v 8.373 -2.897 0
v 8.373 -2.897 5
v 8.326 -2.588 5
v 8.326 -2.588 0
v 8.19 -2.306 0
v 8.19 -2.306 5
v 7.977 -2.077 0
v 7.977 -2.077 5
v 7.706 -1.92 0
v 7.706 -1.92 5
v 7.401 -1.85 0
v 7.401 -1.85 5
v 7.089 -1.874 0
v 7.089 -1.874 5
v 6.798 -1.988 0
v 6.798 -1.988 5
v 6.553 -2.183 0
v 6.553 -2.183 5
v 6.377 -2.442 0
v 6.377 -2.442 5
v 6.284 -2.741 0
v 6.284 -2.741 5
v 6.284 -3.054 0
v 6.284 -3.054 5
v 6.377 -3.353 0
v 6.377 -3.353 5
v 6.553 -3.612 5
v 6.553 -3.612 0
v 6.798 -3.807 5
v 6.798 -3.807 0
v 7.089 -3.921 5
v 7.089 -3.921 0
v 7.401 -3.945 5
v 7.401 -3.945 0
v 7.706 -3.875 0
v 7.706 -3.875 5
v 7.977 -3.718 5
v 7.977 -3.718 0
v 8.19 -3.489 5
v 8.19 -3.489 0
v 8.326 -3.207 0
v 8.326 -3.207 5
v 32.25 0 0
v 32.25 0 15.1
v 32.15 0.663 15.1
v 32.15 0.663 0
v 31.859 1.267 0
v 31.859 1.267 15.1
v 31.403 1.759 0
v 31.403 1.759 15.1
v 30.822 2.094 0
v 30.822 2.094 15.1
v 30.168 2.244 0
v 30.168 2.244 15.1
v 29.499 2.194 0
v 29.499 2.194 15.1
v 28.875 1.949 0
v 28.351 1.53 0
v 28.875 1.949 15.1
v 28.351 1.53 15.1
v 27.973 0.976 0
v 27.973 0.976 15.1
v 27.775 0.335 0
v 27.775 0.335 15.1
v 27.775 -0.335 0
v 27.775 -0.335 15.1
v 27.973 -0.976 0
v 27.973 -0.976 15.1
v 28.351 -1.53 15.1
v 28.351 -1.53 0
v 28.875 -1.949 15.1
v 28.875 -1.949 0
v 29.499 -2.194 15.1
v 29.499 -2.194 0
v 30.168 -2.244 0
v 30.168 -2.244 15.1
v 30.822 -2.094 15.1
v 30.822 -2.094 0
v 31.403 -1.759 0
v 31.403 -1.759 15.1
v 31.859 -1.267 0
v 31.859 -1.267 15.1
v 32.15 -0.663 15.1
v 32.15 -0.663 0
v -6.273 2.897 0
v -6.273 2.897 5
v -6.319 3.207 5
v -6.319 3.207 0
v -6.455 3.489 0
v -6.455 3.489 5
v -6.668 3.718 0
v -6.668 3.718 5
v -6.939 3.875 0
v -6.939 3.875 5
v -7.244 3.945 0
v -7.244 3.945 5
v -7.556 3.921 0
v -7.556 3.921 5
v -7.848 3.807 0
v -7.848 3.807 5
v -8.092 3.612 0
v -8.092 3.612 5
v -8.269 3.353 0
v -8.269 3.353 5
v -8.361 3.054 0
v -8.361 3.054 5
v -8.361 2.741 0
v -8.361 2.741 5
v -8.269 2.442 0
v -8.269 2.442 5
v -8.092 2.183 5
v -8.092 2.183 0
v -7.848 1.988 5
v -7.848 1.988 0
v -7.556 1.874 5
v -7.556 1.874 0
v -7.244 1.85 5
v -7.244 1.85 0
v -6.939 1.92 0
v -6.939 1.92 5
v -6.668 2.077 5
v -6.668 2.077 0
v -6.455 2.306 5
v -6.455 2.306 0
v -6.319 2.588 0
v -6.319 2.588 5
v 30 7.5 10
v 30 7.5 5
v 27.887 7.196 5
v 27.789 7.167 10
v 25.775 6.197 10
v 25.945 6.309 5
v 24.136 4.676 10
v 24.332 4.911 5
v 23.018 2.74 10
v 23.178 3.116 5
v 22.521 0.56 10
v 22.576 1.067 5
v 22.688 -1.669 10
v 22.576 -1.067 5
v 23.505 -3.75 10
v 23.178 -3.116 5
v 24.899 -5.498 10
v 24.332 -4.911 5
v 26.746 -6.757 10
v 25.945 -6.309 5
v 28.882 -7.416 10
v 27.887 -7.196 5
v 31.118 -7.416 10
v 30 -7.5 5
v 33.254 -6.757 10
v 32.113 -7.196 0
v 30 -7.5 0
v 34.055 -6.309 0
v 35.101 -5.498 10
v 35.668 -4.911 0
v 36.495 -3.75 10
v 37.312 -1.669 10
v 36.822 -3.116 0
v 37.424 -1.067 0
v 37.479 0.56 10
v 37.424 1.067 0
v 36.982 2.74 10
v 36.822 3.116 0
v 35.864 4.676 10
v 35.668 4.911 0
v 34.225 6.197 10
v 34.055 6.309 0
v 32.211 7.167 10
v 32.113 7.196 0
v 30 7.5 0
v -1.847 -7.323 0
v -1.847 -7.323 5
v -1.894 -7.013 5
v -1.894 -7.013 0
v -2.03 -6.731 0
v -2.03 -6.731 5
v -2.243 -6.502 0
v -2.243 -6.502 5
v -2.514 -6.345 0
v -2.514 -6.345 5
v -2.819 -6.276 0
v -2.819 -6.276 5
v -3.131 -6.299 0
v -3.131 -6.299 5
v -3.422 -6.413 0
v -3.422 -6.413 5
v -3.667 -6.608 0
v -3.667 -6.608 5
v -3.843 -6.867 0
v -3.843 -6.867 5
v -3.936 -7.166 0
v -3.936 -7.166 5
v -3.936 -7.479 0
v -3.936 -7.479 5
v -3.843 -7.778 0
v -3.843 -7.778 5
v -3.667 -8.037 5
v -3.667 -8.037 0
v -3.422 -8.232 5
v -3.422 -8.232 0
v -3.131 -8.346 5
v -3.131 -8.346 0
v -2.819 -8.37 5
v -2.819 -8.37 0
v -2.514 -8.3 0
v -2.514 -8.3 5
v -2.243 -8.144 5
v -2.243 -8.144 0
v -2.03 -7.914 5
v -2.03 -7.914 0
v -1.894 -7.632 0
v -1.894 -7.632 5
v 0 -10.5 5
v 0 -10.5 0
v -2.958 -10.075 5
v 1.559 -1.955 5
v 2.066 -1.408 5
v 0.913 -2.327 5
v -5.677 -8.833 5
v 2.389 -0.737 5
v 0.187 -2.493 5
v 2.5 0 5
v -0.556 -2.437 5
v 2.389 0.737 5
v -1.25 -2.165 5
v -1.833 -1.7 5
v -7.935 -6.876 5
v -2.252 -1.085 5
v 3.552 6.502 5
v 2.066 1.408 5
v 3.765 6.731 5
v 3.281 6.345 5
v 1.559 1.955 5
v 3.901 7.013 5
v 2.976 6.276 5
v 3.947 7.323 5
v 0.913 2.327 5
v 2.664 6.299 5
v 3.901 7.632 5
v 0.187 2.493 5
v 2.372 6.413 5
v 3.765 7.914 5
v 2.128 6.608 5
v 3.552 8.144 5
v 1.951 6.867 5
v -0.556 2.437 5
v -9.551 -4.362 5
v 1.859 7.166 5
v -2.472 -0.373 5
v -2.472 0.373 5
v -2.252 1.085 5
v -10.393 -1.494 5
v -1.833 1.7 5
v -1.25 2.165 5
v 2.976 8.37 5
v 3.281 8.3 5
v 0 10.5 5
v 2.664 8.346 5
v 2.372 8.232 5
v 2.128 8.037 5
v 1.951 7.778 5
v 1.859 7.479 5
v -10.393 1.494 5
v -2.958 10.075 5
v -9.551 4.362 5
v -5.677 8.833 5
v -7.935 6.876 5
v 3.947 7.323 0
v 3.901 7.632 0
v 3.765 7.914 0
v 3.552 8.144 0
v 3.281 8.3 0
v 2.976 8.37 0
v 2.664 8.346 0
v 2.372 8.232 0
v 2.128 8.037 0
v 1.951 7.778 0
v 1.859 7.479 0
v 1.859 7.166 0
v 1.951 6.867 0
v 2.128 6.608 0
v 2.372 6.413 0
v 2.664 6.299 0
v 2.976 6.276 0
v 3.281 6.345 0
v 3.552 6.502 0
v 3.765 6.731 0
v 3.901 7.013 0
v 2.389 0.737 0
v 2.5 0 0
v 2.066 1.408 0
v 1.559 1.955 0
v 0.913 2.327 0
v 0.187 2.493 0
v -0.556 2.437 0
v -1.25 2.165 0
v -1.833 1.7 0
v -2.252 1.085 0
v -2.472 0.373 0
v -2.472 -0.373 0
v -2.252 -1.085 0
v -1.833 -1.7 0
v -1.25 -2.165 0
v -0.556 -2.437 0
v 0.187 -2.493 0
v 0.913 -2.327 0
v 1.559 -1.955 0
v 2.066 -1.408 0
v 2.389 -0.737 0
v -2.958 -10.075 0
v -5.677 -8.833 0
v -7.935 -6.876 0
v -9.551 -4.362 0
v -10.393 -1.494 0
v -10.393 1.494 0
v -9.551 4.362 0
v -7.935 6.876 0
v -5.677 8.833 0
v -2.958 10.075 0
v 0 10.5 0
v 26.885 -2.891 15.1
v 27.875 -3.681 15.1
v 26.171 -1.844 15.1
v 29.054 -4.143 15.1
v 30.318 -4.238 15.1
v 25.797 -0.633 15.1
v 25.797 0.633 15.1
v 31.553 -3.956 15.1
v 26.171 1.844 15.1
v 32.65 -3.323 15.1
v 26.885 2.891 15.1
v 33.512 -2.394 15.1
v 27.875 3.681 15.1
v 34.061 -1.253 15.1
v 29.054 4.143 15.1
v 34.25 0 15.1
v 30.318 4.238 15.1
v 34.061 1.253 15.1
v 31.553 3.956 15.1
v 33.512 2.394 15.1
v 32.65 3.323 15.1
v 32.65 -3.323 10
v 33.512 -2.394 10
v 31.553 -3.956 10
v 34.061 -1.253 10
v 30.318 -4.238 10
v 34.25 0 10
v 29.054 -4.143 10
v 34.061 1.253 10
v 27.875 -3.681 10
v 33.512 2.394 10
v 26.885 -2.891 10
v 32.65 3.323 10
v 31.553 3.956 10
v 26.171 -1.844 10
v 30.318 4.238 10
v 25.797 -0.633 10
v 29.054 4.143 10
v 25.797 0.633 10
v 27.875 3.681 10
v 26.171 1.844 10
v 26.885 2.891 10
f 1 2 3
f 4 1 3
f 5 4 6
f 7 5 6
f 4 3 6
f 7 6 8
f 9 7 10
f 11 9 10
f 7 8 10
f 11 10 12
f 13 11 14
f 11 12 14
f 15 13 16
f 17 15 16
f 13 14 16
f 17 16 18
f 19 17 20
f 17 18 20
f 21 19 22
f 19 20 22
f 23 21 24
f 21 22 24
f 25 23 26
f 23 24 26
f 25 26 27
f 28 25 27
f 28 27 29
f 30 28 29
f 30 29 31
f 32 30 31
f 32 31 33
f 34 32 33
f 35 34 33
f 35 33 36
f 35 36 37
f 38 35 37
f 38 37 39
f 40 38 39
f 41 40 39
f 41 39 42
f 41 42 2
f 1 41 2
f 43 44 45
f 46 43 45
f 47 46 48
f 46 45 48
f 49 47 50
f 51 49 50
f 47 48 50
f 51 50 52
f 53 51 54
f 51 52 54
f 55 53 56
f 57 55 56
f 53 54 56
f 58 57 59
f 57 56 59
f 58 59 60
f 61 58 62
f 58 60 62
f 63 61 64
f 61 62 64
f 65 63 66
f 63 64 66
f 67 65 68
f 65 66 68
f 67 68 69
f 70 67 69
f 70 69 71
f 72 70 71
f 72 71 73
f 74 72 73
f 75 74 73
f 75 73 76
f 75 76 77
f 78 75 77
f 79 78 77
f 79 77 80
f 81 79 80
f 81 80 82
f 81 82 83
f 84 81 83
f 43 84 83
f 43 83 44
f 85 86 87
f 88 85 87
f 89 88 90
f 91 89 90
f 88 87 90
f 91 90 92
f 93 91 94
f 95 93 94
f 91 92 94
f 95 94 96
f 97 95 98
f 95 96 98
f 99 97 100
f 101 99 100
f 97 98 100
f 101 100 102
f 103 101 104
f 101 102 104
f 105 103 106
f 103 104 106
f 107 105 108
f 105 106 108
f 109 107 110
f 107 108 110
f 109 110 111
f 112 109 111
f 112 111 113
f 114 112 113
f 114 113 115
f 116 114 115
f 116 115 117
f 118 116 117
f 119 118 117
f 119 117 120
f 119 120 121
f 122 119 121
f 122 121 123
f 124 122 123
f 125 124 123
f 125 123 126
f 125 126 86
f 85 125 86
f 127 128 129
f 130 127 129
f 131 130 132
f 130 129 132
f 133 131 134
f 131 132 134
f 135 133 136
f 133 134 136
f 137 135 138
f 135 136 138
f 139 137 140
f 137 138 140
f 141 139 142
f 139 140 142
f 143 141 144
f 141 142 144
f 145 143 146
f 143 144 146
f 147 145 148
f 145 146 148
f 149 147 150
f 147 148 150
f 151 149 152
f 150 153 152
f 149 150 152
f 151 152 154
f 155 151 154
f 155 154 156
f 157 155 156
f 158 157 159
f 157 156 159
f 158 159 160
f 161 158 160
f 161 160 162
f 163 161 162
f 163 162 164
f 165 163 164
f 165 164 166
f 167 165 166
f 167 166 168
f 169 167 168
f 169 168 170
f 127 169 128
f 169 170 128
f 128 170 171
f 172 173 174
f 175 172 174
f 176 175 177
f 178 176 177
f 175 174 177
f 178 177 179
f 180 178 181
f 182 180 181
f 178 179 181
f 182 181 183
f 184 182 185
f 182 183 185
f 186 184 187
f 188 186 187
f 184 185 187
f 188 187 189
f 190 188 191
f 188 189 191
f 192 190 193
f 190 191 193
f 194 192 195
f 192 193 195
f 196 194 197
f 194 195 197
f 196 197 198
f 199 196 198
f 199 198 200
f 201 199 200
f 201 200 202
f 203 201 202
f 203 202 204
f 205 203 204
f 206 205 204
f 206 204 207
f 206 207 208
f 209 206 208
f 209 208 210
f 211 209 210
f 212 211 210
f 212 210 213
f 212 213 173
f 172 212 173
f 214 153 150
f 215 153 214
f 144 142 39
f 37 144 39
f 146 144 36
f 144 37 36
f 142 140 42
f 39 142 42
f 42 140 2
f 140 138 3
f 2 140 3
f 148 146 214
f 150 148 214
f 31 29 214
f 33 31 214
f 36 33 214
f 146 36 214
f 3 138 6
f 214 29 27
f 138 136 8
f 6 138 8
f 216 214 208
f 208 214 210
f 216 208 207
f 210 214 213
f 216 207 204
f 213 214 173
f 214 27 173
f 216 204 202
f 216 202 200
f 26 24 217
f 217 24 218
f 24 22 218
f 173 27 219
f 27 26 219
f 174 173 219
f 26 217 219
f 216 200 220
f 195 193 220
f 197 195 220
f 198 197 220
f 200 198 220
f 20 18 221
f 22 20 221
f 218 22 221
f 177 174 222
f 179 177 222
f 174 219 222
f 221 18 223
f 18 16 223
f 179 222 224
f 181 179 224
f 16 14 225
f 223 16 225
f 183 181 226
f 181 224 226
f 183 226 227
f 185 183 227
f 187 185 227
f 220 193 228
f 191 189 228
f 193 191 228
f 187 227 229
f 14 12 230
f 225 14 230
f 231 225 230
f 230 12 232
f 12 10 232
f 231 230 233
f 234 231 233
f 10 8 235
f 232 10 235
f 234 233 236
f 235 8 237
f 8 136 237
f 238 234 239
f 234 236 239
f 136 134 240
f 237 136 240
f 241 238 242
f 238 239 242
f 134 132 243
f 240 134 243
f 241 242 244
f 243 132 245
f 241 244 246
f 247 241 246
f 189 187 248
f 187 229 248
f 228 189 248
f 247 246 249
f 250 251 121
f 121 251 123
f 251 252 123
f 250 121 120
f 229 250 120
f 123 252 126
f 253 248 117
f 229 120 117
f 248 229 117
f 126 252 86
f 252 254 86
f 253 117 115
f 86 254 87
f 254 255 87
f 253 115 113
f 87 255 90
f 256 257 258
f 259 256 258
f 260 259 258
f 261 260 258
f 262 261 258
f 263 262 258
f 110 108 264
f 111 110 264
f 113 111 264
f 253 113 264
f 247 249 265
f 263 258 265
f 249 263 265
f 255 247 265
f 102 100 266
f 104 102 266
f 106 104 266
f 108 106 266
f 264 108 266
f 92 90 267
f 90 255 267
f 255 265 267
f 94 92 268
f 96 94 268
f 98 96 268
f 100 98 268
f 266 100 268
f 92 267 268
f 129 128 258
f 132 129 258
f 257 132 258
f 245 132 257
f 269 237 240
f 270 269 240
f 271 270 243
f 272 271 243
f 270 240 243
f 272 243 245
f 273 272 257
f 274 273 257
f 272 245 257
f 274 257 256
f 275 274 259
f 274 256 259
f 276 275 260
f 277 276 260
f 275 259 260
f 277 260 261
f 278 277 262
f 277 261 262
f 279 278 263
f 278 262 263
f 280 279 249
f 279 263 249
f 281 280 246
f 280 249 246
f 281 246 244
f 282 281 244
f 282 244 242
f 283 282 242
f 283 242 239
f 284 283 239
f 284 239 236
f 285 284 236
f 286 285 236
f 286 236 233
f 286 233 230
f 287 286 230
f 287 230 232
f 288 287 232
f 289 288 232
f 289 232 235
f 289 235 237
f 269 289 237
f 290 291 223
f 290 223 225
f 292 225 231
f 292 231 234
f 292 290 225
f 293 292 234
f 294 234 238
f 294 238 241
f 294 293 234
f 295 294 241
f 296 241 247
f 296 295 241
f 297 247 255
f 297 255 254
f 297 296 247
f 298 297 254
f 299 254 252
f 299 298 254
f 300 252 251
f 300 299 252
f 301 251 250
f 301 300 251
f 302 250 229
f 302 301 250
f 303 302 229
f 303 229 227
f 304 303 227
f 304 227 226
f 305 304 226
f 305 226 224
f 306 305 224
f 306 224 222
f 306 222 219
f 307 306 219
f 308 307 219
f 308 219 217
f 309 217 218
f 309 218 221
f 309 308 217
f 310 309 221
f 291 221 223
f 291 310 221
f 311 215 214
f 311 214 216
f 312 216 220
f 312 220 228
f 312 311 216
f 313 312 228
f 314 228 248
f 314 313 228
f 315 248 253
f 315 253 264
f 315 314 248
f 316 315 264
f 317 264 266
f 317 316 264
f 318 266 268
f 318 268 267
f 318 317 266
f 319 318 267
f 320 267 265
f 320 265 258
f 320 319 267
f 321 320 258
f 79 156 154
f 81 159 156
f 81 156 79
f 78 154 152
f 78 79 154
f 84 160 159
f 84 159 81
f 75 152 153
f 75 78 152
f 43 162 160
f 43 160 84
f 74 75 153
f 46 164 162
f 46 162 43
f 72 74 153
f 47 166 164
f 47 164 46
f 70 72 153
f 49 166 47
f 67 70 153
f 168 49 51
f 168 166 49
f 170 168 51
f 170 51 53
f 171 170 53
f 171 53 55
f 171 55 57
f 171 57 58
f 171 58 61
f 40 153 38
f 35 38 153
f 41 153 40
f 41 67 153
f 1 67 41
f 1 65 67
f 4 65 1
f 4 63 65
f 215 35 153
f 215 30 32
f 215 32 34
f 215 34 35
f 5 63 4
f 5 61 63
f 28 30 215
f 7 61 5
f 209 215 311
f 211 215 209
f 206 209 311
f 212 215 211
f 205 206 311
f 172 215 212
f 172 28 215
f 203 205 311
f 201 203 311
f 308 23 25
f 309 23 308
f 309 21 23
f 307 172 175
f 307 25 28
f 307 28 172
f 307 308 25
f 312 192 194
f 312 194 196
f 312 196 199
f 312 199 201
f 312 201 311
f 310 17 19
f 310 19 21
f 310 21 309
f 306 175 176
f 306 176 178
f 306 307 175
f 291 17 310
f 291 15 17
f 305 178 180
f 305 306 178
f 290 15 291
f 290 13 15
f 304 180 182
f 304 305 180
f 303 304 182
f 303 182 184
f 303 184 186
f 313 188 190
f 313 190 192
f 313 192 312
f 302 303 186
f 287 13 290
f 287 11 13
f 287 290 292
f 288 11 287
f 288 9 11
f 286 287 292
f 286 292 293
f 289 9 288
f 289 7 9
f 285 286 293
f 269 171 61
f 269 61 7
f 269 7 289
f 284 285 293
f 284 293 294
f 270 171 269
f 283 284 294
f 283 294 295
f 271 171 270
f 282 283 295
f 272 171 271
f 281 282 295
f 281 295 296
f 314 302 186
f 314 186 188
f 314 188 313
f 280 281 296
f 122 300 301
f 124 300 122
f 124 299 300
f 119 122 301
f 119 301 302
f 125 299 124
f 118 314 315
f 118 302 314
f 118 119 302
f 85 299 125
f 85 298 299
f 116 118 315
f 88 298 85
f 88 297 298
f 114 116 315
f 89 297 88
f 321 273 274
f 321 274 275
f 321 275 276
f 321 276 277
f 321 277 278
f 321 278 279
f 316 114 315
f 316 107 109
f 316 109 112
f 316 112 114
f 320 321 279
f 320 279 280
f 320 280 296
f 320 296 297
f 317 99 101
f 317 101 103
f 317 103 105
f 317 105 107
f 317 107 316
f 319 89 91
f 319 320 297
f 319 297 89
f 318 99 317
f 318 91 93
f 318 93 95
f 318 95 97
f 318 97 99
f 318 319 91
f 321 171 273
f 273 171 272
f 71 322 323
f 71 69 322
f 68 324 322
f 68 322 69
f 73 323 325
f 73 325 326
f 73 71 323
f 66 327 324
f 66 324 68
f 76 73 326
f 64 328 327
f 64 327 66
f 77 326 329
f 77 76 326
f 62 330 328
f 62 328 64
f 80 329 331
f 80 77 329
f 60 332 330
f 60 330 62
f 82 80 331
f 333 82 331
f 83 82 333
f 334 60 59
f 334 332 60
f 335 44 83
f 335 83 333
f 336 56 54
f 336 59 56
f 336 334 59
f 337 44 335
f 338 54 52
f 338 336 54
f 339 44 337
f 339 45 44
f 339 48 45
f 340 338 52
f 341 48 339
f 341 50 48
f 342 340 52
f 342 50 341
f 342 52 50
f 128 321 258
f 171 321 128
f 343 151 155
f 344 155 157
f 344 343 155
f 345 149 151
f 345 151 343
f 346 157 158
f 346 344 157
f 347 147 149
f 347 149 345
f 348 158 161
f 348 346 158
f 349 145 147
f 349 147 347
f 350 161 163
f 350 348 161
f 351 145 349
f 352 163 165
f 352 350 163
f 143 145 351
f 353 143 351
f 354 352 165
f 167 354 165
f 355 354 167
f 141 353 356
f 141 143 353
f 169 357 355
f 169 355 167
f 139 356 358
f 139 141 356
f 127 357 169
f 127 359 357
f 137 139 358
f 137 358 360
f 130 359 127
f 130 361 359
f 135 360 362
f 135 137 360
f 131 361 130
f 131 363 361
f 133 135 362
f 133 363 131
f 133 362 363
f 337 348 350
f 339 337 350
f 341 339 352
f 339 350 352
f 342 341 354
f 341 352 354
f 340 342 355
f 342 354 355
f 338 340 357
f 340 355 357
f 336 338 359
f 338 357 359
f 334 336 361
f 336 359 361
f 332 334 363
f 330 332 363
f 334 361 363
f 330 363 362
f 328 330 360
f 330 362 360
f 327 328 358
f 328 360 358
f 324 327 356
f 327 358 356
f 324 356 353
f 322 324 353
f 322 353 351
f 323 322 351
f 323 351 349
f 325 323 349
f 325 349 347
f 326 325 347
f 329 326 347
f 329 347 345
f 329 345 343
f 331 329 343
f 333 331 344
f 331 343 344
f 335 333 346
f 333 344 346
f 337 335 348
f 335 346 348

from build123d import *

# Parameters (mm, degrees)
SKETCH_1_R           = 2.5
EXTRUDE_1_DEPTH      = 5
SKETCH_2_R           = 7.5
EXTRUDE_2_DEPTH      = 5
SKETCH_3_R           = 4.25
EXTRUDE_3_DEPTH      = 5.1
SKETCH_4_R           = 2.25
CUT_EXTRUDE_1_DEPTH  = 36.1
HOLE_WIZARD_M1_8_1_D = 2.1


with BuildPart() as part:
    # 스케치1 → 보스-돌출1 (new body)
    with BuildSketch(Plane.XY):
        with BuildLine():
            Line((0, 10.5), (30, 7.5))
            ThreePointArc((30, 7.5), (37.5, 0), (30, -7.5))
            Line((30, -7.5), (0, -10.5))
            ThreePointArc((0, -10.5), (-10.5, 0), (0, 10.5))
        make_face()
        Circle(SKETCH_1_R, mode=Mode.SUBTRACT)
    extrude(amount=EXTRUDE_1_DEPTH)

    # 스케치2 → 보스-돌출2 (add)
    with BuildSketch(Plane.XY.offset(5)):
        with Locations(Location((30, 0, 0), (0, 0, 90))):
            Circle(SKETCH_2_R)
    extrude(amount=EXTRUDE_2_DEPTH)

    # 스케치3 → 보스-돌출3 (add)
    with BuildSketch(Plane.XY.offset(10)):
        with Locations((30, 0)):
            Circle(SKETCH_3_R)
    extrude(amount=EXTRUDE_3_DEPTH)

    # 스케치4 → 컷-돌출1 (cut)
    with BuildSketch(Plane.XY.offset(15.1)):
        with Locations((30, 0)):
            Circle(SKETCH_4_R)
    extrude(amount=-CUT_EXTRUDE_1_DEPTH, mode=Mode.SUBTRACT)

    # M1.8 여유 구멍1 (through all)
    with Locations(Plane(origin=(0, 0, 0), x_dir=(-1, 0, 0), z_dir=(0, 0, -1))):
        with Locations((2.897458491, -7.322595938), (-7.322595938, -2.897458491), (7.322595938, 2.897458491), (-2.897458491, 7.322595938)):
            Hole(HOLE_WIZARD_M1_8_1_D / 2)


solid = part.part
